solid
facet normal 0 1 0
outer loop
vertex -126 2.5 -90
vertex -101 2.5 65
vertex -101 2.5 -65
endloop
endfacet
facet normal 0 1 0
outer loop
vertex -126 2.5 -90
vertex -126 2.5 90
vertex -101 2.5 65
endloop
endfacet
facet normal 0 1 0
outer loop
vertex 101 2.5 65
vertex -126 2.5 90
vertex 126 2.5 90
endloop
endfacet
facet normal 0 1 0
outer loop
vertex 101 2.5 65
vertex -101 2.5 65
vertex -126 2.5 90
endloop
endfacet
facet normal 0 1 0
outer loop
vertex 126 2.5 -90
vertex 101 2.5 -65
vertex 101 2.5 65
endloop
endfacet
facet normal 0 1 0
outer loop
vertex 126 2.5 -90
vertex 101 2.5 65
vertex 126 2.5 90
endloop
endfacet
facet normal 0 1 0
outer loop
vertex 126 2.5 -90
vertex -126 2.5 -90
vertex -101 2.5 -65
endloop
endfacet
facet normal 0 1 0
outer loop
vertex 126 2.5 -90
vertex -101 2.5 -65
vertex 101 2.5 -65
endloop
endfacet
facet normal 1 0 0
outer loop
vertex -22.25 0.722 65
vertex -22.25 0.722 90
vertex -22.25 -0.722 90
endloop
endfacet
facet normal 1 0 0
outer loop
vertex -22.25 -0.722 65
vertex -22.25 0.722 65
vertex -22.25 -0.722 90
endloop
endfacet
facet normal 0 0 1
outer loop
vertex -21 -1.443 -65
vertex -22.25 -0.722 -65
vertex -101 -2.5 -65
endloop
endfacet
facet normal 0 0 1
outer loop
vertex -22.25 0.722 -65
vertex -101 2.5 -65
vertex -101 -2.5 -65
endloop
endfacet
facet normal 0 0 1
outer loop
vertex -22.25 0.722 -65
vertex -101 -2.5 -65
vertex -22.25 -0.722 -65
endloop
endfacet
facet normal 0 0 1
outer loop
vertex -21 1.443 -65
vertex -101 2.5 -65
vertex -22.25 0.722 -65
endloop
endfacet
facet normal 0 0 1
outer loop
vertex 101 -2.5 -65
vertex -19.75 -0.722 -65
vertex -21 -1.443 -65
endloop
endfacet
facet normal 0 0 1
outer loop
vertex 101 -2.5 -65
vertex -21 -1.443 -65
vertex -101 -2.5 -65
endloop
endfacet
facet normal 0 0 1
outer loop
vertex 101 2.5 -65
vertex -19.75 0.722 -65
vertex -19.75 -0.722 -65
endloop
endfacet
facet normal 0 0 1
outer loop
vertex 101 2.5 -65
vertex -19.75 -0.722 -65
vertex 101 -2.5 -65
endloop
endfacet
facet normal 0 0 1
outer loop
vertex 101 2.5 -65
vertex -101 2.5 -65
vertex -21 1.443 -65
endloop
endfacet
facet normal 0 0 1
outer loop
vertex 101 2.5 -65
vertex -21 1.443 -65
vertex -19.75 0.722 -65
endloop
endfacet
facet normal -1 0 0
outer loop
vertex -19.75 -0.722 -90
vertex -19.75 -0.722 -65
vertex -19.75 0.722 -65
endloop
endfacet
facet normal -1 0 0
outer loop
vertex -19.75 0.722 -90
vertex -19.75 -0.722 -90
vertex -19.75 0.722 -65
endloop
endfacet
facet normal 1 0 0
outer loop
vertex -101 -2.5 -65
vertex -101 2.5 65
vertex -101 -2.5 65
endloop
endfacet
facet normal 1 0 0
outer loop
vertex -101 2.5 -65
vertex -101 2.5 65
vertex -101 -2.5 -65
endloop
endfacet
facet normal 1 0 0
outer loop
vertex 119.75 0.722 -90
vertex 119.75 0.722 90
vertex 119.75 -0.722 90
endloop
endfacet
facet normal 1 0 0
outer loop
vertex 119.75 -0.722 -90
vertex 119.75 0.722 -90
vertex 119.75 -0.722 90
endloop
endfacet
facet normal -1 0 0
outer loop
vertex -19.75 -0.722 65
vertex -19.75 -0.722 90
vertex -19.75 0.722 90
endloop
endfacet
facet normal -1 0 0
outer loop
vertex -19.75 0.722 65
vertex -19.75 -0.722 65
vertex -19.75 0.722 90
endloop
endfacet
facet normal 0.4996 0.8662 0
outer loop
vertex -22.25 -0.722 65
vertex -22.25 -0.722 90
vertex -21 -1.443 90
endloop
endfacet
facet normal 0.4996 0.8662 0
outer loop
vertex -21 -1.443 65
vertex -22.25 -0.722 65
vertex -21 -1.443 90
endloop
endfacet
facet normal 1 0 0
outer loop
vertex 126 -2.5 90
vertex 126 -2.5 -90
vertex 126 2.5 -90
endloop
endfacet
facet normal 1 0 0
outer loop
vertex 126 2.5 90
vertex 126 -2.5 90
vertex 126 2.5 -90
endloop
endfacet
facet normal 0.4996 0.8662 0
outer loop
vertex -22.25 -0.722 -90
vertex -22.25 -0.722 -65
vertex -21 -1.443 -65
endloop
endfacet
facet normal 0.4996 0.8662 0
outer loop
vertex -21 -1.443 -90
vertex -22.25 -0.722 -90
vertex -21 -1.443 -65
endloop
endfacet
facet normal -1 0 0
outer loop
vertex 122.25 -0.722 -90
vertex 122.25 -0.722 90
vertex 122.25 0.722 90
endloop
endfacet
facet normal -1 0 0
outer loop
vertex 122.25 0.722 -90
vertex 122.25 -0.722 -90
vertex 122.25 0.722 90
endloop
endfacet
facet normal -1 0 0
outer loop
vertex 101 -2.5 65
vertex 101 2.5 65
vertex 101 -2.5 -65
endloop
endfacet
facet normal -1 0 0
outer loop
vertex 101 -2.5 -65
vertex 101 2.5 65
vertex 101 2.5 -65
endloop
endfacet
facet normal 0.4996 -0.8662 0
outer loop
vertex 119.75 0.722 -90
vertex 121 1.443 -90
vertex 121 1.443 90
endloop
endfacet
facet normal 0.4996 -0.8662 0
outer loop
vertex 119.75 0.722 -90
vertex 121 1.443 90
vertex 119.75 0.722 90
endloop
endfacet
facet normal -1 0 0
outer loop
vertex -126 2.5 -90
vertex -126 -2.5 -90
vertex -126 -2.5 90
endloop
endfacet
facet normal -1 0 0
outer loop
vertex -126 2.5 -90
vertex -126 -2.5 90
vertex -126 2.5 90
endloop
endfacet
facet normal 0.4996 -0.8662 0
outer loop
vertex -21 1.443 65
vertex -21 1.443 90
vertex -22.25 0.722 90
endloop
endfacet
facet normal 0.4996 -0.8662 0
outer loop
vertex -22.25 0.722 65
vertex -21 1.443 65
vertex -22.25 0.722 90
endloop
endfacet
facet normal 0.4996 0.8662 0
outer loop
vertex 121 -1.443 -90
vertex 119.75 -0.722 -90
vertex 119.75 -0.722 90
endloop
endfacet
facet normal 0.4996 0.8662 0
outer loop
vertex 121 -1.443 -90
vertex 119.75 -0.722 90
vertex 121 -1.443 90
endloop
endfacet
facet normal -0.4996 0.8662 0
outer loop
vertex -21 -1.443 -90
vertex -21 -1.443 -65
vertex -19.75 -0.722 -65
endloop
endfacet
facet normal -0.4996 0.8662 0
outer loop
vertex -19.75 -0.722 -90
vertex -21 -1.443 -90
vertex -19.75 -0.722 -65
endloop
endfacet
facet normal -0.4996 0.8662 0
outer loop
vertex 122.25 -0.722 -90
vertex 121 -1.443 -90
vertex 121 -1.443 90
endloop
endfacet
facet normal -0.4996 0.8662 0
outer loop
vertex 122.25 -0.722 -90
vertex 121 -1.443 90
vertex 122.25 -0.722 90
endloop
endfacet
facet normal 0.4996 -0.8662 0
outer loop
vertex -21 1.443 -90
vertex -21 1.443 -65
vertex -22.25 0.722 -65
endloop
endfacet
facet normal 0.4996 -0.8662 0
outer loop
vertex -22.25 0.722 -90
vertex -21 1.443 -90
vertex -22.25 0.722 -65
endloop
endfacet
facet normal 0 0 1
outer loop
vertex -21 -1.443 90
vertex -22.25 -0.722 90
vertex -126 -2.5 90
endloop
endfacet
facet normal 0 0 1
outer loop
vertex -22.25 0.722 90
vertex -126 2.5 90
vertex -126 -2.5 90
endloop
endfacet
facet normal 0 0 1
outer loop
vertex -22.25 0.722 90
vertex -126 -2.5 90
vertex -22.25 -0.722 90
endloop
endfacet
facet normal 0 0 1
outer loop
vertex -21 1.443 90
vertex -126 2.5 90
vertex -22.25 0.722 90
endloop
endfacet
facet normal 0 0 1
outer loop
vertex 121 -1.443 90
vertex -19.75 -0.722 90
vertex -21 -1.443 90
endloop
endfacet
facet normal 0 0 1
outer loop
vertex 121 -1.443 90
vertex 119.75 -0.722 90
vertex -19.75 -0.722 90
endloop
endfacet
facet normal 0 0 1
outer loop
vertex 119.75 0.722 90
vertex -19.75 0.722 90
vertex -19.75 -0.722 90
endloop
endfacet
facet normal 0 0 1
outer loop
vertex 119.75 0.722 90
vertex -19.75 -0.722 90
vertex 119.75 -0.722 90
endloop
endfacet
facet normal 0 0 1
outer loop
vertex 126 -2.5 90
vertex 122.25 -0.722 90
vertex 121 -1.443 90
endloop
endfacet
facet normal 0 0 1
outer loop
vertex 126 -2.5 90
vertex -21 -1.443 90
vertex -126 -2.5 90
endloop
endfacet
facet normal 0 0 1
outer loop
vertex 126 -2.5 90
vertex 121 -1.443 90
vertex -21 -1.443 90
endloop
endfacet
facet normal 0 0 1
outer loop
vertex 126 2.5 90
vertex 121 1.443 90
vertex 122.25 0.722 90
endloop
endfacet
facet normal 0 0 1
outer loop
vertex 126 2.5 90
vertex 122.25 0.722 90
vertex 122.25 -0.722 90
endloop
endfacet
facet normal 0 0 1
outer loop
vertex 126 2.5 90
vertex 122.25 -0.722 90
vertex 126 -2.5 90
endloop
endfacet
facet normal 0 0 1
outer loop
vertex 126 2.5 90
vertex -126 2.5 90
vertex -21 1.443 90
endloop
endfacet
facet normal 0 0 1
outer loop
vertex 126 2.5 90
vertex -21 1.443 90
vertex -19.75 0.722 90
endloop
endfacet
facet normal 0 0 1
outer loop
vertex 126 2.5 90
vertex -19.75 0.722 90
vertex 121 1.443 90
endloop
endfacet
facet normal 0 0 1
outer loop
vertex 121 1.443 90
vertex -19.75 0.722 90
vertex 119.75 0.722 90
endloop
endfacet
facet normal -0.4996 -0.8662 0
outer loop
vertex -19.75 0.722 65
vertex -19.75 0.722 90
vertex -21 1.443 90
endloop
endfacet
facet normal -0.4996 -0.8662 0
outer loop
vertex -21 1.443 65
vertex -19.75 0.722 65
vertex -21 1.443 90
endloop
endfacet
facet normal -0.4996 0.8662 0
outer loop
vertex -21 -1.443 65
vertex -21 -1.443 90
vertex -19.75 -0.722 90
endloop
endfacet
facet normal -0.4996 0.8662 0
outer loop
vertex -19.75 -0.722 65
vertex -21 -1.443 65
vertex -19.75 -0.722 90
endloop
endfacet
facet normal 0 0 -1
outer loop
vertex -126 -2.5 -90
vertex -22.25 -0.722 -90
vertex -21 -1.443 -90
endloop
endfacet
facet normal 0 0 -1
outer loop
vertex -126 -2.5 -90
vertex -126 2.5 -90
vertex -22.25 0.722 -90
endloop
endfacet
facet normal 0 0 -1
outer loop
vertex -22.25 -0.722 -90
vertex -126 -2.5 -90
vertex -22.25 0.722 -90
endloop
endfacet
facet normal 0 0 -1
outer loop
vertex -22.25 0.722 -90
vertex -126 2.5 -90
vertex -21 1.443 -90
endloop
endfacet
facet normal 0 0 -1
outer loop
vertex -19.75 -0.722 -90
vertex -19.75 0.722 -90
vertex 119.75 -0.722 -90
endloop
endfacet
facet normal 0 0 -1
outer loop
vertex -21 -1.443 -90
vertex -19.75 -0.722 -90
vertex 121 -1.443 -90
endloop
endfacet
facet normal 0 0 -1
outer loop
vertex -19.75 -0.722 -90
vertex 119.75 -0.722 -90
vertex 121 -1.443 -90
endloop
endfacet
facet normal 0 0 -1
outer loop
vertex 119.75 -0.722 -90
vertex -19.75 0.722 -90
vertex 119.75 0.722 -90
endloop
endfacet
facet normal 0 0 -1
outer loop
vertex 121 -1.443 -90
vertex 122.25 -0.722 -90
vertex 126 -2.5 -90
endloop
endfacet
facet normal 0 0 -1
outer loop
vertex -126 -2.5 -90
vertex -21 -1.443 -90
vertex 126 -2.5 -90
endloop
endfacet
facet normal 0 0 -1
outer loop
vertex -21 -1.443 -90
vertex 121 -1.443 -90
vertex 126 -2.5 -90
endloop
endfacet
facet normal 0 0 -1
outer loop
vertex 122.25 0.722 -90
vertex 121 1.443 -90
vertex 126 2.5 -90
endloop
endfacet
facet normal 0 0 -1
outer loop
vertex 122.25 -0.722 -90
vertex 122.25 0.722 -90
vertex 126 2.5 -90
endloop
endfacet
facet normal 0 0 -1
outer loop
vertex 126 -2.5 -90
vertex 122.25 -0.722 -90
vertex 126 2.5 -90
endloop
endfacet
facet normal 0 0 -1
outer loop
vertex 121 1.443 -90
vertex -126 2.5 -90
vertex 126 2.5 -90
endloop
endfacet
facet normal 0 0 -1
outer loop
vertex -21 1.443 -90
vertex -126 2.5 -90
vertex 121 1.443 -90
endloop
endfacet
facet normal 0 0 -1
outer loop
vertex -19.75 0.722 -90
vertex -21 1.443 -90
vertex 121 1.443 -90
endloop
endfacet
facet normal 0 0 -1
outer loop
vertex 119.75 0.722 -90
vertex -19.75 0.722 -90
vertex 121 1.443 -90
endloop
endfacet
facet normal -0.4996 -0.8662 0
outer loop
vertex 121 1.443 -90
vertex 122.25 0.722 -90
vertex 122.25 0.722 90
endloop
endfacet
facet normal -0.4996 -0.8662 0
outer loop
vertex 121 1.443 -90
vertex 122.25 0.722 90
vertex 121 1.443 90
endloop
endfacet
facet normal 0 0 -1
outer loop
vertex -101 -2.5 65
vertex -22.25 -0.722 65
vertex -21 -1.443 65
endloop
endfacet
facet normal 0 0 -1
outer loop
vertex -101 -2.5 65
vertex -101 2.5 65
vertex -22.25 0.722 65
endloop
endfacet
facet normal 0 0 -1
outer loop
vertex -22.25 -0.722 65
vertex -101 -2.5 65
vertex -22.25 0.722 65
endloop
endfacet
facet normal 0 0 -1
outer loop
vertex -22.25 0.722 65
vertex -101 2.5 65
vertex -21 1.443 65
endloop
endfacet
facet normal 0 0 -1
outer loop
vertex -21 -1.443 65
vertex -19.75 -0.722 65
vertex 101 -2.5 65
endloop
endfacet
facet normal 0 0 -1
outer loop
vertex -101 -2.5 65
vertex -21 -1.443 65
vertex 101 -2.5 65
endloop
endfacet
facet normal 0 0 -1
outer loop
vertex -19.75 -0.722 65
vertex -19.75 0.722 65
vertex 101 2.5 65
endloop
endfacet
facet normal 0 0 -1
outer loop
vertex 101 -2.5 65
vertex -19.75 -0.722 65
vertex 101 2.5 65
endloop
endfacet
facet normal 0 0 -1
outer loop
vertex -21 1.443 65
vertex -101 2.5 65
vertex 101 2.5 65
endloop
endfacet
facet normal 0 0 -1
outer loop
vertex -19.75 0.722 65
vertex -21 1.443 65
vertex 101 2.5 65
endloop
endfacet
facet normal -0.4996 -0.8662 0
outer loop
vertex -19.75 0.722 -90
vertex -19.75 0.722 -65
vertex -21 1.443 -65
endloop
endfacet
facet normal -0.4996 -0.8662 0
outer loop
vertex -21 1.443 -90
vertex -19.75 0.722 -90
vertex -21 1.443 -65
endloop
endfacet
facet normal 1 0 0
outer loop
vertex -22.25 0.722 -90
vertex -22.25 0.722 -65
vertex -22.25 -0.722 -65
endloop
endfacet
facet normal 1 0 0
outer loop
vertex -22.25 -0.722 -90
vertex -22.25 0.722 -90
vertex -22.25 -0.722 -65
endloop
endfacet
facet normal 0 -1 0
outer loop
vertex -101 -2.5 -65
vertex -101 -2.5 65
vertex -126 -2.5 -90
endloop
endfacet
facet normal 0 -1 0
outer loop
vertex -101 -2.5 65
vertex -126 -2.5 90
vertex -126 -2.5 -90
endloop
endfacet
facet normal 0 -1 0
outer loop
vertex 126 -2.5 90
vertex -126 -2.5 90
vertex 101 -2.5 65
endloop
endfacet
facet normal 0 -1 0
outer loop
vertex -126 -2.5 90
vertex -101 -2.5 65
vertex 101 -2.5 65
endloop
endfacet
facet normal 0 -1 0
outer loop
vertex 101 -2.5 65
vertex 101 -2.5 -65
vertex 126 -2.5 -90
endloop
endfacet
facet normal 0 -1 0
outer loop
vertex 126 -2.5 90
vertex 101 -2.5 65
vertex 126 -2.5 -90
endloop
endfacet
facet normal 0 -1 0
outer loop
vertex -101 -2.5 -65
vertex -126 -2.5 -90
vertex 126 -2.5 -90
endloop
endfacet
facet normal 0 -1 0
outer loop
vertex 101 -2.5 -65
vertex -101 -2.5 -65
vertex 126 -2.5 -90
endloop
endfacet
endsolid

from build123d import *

# Parameters (mm, degrees)
BOSS_EXTRUDE1_DEPTH      = 90
BOSS_EXTRUDE1_DEPTH_BACK = 90
SKETCH1_W                = 252
SKETCH1_H                = 5
CUT_EXTRUDE1_DEPTH       = 220.732223399
SKETCH5_W                = 202
SKETCH5_H                = 130
CUT_EXTRUDE3_DEPTH       = 155.922561301


with BuildPart() as part:
    # Sketch1 → Boss-Extrude1 (new, two sides: drawn at the far end of the back side and taken through both)
    with BuildSketch(Plane.XY.offset(-BOSS_EXTRUDE1_DEPTH_BACK)):
        Rectangle(SKETCH1_W, SKETCH1_H)
    extrude(amount=BOSS_EXTRUDE1_DEPTH + BOSS_EXTRUDE1_DEPTH_BACK)

    # Sketch2 → Cut-Extrude1 (cut, through all)
    with BuildSketch(Plane.XY.offset(90)):
        Polygon((-21, 1.443375673), (-22.25, 0.721687836), (-22.25, -0.721687836), (-21, -1.443375673), (-19.75, -0.721687836), (-19.75, 0.721687836), align=None)
        Polygon((121, 1.443375673), (119.75, 0.721687836), (119.75, -0.721687836), (121, -1.443375673), (122.25, -0.721687836), (122.25, 0.721687836), align=None)
    extrude(amount=-CUT_EXTRUDE1_DEPTH, mode=Mode.SUBTRACT)

    # Sketch5 → Cut-Extrude3 (cut, through all)
    with BuildSketch(Plane(origin=(0, 2.5, 0), x_dir=(1, 0, 0), z_dir=(0, 1, 0))):
        Rectangle(SKETCH5_W, SKETCH5_H)
    extrude(amount=-CUT_EXTRUDE3_DEPTH, mode=Mode.SUBTRACT)


solid = part.part
